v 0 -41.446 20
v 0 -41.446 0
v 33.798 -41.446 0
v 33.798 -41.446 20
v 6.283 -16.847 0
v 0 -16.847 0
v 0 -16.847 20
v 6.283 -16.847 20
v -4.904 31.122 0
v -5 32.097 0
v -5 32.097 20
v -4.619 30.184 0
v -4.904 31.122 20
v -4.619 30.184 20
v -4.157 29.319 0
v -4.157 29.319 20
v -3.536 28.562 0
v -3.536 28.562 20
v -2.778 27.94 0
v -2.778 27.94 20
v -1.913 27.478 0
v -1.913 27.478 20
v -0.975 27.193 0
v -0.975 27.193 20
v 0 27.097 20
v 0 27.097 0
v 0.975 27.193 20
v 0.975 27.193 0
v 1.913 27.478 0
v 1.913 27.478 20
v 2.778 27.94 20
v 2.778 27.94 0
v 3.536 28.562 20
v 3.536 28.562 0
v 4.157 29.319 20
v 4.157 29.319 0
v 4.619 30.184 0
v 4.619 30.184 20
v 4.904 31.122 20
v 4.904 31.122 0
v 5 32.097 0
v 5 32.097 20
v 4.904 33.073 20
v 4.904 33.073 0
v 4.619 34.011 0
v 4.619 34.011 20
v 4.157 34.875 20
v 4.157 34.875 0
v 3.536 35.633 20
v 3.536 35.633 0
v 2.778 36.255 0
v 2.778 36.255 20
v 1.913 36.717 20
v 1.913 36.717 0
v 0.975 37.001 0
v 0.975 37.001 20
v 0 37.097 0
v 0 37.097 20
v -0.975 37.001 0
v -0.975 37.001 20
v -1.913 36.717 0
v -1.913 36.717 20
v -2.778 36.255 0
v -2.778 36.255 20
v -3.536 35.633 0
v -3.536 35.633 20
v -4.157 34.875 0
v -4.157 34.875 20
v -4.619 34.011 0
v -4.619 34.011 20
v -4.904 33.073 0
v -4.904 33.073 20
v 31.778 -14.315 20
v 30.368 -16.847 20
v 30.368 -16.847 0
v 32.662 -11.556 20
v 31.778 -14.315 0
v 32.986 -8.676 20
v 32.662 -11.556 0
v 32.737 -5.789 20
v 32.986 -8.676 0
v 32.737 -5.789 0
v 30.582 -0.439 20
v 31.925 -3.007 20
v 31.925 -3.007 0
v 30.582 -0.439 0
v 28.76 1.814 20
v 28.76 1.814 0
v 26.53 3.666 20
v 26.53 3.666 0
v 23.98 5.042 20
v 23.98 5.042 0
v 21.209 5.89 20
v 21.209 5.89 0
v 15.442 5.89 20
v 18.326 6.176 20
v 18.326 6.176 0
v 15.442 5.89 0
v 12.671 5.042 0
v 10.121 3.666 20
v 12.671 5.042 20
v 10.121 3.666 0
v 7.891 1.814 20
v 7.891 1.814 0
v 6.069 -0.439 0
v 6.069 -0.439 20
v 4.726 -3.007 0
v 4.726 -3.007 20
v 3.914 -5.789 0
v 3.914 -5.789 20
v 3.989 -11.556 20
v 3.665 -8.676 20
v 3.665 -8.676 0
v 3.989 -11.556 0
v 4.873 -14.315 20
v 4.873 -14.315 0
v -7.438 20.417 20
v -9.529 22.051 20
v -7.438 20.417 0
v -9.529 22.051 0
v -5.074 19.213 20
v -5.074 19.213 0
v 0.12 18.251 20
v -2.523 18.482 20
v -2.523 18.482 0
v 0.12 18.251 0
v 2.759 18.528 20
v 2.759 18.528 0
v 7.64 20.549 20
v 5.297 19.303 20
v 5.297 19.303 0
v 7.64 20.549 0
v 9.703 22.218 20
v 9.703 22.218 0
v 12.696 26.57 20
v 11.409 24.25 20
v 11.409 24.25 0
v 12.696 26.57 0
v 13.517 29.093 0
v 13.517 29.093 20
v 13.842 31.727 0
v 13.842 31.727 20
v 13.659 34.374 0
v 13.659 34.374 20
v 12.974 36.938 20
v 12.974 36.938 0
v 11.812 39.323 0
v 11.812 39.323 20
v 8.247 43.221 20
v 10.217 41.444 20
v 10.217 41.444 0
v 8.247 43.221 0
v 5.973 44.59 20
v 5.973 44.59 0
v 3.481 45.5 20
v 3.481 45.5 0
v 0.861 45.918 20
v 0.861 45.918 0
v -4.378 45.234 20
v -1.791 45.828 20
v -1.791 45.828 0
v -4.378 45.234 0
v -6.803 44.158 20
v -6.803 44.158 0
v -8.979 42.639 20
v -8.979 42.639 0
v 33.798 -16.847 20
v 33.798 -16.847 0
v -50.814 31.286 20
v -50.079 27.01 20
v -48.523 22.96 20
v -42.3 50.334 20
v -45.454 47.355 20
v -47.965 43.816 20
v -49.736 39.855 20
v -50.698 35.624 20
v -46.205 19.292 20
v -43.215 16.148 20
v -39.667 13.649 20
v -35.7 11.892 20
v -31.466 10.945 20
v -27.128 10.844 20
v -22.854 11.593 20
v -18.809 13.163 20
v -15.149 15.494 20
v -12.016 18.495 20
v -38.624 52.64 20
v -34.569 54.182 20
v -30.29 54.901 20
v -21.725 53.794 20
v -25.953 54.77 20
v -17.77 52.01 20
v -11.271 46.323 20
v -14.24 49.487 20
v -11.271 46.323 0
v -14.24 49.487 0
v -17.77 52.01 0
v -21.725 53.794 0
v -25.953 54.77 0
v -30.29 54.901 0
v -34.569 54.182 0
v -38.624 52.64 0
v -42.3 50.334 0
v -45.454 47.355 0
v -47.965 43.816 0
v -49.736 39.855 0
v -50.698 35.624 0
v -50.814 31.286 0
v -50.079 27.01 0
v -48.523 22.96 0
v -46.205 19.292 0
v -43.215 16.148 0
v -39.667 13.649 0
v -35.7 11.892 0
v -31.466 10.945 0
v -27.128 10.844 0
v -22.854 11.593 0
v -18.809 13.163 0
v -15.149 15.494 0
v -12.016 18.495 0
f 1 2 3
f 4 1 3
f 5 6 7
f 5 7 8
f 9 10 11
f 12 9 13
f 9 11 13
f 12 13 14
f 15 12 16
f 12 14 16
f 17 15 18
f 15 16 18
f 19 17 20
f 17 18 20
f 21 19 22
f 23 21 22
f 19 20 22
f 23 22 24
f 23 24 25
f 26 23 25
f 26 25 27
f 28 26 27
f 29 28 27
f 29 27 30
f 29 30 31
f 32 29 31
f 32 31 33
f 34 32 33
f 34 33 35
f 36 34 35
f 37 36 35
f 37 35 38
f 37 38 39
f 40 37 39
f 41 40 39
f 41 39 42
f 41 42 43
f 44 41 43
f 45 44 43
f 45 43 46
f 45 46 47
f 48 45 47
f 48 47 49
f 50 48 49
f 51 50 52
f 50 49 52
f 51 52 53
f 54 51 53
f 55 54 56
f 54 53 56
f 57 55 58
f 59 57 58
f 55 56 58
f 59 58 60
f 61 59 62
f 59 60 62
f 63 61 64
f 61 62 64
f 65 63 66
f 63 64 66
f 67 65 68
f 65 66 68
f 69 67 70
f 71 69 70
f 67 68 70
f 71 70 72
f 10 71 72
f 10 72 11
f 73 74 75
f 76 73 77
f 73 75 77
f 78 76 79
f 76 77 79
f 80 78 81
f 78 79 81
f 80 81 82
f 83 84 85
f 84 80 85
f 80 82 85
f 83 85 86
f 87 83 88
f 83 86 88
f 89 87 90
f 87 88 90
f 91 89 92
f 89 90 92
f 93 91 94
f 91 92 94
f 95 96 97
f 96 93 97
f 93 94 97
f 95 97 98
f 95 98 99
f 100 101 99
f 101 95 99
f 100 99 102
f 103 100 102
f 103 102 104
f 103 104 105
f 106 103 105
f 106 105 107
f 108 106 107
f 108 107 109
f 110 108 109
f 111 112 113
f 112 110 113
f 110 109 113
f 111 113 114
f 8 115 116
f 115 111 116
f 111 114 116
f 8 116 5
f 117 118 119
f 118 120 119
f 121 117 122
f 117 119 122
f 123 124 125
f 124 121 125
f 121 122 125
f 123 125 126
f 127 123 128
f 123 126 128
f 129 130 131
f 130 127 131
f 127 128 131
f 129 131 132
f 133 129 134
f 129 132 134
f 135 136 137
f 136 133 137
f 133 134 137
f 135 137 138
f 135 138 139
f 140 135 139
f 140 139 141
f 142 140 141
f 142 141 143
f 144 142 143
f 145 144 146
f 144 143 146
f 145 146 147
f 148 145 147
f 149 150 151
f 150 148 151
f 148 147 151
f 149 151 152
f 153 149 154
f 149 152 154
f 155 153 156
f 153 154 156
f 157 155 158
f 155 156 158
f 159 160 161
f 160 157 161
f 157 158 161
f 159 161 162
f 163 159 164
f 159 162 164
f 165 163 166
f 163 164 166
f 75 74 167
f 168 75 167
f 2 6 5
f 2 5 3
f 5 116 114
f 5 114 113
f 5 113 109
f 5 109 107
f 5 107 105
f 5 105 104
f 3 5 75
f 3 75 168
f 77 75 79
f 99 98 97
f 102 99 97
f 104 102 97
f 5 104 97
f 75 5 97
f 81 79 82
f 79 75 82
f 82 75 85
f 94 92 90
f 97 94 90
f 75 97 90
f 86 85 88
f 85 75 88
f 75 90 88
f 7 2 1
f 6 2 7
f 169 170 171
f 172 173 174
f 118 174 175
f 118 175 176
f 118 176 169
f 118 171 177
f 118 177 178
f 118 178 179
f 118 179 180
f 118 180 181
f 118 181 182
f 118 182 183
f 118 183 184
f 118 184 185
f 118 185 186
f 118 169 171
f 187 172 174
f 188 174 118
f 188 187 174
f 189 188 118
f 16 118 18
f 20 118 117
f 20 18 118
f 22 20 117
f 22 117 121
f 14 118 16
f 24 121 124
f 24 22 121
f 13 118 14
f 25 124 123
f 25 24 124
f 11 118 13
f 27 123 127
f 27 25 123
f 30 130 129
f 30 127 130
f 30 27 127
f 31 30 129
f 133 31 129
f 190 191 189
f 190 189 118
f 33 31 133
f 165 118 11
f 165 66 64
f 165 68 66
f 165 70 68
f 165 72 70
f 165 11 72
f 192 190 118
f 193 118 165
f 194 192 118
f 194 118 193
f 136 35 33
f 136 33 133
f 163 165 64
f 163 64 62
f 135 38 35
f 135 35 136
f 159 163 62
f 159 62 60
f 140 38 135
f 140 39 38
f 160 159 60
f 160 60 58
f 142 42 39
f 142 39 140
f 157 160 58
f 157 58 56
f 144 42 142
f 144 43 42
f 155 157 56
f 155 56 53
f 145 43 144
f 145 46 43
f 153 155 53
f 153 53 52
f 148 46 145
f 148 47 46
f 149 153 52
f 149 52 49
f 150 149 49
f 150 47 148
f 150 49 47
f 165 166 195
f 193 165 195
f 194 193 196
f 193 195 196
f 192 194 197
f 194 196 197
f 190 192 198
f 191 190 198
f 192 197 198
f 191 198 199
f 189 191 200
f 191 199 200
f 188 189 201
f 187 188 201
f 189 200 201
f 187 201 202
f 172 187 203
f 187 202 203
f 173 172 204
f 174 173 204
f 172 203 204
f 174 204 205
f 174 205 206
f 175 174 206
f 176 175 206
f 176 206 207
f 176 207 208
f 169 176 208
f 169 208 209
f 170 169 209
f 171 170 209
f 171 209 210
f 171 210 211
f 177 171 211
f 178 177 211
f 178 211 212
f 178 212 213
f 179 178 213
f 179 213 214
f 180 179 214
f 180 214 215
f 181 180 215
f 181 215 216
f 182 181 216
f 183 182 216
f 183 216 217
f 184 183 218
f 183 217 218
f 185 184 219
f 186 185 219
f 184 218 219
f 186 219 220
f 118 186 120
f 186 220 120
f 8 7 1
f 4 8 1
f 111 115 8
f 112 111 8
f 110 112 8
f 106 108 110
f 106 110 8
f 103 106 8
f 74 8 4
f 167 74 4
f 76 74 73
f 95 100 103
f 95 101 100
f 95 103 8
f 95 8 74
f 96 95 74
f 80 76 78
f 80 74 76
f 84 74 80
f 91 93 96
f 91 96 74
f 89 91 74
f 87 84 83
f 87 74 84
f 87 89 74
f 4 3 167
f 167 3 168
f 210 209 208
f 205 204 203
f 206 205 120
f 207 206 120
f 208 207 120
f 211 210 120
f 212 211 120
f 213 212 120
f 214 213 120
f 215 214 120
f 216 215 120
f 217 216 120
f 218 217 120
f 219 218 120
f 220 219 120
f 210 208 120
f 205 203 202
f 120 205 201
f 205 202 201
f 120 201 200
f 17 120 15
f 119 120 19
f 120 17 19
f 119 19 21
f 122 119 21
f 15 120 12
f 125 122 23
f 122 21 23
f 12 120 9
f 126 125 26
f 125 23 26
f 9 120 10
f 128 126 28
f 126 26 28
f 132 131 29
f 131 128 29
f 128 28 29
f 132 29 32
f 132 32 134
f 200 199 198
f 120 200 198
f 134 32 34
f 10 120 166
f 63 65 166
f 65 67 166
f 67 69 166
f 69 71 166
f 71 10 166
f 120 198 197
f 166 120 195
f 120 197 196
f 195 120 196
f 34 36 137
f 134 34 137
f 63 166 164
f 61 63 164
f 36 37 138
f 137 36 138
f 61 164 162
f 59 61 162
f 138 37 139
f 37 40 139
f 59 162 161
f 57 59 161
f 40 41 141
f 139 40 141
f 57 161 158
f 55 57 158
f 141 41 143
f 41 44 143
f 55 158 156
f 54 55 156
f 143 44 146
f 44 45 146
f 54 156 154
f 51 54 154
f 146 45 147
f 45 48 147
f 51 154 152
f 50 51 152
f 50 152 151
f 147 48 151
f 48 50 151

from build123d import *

# Parameters (mm, degrees)
F0_W     = 33.7982140481
F0_H     = 24.5983228087
F1_DEPTH = 20
F2_R     = 13.8471183211
F3_DEPTH = 20
F4_R     = 14.6614237311
F5_DEPTH = 20
F6_D     = 10
F7_R     = 22.0854860792
F8_DEPTH = 20


with BuildPart() as f1:
    # F0 (on Top) → F1 (new body)
    with BuildSketch(Plane.XY):
        with Locations((16.8991070241, -29.146451503)):
            Rectangle(F0_W, F0_H)
    extrude(amount=F1_DEPTH)

    # F4 (on Top) → F5 (join)
    with BuildSketch(Plane.XY):
        with Locations((18.3255169541, -8.4850527346)):
            Circle(F4_R)
    extrude(amount=F5_DEPTH)


with BuildPart() as f3:
    # F2 (on Top) → F3 (new body)
    with BuildSketch(Plane.XY):
        with Locations((0, 32.0972390473)):
            Circle(F2_R)
    extrude(amount=F3_DEPTH)

    # F6 (through all)
    with Locations(Plane(origin=(0, 0, 0), x_dir=(1, 0, 0), z_dir=(0, 0, -1))):
        with Locations((0, -32.0972390473)):
            Hole(F6_D / 2)

    # F7 (on Top) → F8 (join)
    with BuildSketch(Plane.XY):
        with Locations((-28.7847071886, 32.8672938049)):
            Circle(F7_R)
    extrude(amount=F8_DEPTH)


solid = Compound([f1.part, f3.part])
